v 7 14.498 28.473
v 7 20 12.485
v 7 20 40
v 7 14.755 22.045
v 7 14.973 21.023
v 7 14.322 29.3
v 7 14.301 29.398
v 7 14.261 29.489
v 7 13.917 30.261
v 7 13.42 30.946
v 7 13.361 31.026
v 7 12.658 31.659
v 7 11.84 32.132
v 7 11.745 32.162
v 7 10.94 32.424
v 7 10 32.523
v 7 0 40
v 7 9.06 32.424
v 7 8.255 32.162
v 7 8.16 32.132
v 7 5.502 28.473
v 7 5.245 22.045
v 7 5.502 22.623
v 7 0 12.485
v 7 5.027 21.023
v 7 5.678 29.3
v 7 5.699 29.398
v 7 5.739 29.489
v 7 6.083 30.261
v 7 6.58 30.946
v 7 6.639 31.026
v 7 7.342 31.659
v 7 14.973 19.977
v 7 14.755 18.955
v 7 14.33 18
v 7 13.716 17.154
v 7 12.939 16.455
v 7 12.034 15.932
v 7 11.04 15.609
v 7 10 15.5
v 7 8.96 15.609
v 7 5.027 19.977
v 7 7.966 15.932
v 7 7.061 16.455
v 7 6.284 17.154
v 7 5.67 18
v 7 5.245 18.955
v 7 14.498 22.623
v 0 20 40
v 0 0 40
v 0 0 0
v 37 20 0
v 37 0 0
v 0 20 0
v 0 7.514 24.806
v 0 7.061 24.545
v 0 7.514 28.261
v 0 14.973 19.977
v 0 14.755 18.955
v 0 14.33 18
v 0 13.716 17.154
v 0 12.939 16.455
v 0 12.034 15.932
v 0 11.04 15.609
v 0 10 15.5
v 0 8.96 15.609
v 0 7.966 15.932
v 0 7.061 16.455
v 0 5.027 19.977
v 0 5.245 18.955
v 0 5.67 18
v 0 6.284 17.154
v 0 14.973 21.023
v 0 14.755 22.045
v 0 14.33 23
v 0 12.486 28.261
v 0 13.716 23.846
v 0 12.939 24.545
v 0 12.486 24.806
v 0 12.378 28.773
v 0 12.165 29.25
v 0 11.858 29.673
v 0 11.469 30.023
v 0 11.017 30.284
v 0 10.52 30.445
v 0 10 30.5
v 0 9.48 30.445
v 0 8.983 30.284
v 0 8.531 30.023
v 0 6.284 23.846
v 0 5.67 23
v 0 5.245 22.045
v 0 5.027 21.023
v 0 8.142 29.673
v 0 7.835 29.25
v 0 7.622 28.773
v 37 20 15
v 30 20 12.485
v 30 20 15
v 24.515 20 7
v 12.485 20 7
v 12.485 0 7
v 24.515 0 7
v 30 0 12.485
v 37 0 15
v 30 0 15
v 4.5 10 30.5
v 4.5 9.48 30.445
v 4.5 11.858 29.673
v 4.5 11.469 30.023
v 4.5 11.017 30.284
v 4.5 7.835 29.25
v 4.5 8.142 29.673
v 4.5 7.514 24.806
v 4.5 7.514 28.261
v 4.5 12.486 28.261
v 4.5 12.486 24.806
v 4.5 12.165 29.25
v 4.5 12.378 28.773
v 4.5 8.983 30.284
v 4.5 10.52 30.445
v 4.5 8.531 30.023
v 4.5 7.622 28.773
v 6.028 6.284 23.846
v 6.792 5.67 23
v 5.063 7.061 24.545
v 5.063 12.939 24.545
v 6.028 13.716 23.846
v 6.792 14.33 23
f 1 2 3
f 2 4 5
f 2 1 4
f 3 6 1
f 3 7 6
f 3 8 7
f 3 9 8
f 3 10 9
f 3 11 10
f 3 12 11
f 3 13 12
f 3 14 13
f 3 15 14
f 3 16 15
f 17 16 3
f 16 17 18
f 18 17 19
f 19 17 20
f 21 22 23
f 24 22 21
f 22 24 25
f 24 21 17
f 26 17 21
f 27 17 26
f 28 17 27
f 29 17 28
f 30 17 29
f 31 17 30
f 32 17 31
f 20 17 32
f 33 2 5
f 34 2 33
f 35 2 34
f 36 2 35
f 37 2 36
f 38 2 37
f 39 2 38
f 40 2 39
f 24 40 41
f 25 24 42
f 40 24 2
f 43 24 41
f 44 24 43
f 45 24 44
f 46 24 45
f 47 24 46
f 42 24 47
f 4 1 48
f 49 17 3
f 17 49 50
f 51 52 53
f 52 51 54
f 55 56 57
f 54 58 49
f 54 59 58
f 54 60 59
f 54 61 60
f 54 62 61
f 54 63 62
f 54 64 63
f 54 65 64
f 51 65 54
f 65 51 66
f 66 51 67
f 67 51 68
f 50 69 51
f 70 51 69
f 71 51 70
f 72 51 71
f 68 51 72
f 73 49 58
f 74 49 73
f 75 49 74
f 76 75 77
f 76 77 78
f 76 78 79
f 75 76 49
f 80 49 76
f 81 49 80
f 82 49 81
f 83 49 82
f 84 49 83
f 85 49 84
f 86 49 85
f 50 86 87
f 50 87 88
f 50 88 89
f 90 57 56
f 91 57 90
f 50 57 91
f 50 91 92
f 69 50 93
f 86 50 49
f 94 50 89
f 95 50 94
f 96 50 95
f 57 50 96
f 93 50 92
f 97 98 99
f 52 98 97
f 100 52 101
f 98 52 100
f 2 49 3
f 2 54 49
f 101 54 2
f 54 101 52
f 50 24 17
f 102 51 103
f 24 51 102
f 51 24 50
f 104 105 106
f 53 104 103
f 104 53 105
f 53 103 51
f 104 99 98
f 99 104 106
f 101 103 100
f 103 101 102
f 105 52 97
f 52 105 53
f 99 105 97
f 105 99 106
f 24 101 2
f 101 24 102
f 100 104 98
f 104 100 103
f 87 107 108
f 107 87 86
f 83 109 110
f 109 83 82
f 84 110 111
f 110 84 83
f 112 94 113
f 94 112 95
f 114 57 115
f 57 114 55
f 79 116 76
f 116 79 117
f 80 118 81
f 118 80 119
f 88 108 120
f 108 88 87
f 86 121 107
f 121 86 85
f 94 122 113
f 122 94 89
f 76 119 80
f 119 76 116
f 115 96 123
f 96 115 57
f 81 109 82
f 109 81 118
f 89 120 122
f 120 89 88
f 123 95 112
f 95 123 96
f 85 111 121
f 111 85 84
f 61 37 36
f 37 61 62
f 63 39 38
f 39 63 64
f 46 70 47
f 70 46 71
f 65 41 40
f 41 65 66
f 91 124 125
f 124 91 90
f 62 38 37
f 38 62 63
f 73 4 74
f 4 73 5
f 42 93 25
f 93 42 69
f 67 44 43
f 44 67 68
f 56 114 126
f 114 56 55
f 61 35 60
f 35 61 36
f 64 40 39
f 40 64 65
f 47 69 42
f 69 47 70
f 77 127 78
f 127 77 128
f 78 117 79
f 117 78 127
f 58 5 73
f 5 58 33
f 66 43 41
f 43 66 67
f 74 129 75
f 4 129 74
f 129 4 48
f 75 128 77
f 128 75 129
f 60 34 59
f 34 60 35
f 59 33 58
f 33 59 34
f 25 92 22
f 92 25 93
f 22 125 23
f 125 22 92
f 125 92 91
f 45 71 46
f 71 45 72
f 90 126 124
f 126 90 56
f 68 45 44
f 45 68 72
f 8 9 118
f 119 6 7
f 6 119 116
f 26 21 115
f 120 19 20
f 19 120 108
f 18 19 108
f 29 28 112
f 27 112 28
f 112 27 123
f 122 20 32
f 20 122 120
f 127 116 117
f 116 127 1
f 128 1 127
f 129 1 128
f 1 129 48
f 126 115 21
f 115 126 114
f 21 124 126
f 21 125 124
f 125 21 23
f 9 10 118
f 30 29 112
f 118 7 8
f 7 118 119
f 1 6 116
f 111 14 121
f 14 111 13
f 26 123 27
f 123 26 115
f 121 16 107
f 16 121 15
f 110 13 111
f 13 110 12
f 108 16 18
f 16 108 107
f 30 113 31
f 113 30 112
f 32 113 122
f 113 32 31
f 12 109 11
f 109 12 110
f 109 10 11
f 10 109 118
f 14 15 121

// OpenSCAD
// length of the hook
hookLength = 20;

// height of the wall mounted part
hookHeight = 40;

// depth of the hook area
hookDepth = 23;

// number of holes
holeCount = 1; // [0:70]

// hole diameter
holeDiameter = 5;

// hole offset to the top and the sides of the hook
holeOffset = 12;

// activates the tapered holes
holeTapered = 1; // [0:No, 1:Yes]

// enables the keyhole-style opening
holeKeyhole = 1; // [0:No, 1:Yes]

// separated hook count
hookCount = 1;

// distance from hook to hook
hookDistance = 20;

// activate rounded Corners (the hook will get 2mm thicker) [EXPERIMENTAL]
roundCorners  = 0; // [0:No, 1:Yes]

holeRadius = holeDiameter / 2.;
holeRadiusCountersunk = holeRadius * 2;
holeDepthCountersunk = holeRadius * 1;
holeZ = hookHeight - holeOffset;

holeDistance = (hookLength - (2 * holeOffset)) / 
(holeCount - 1);

hookSeperatorDistance = (hookLength - (hookDistance * (hookCount - 1))) / (hookCount);

module MyHook(){
	// set number of faces
	$fn=30; 
	
	difference(){
		if(roundCorners){
			minkowski(){
				plainMultipleHook();
				sphere(1, centered=true, $fn=20);
			}
		}else{
			plainMultipleHook();
		}
		generateHoles();
		
	}
}

module plainMultipleHook(){
	difference(){
		plainHook();
		multipleHookSpacers();
	}
}

module plainHook(){
	union(){
		// upper
		cube([7,hookLength,hookHeight]);
			
		// lower
		translate([7,0,0]) cube([hookDepth ,hookLength,7]);
		// hook
		translate([7 + hookDepth ,0,0]) cube([7,hookLength,15]);
			
		// corners
		translate([2,0,9]) rotate([0,45,0]) cube([10,hookLength,6]);
		translate([hookDepth + 5 ,0,2]) rotate([0,-45,0]) cube([10,hookLength,6]);
	}
}

module multipleHookSpacers(){
	// seperator boxes
	if(hookCount >= 2){
		for(seperator = [1: hookCount - 1]){
			translate([13, seperator * hookSeperatorDistance + hookDistance * (seperator - 1), -1]) cube([hookDepth + 7, hookDistance, 17]);
		}
	}
}

module generateHoles(){
	if(holeCount == 1){
		holeYPosition = hookLength / 2;
		generateSingleHole(holeYPosition);
	}else{
		
		for(hole = [0: holeCount - 1]){
			holeYPosition = hole * holeDistance + holeOffset;
			generateSingleHole(holeYPosition);
		}
	}
}

module generateSingleHole(holeYPosition){
	translate([0, holeYPosition, holeZ]){
		// hole
		translate([-5,0,0])
		rotate([0,90,0])
		cylinder(22, holeRadius, holeRadius);
		
		// tapering
		if(holeTapered){
			hull() {
				union() {
					translate([7 - holeDepthCountersunk, 0, 0])
					rotate([0,90,0])
					cylinder(3.1, holeRadius, holeRadiusCountersunk);
					
					translate([7.59, 0, 0])
					rotate([0,90,0])
					cylinder(10,holeRadiusCountersunk, holeRadiusCountersunk);
				}
				if(holeKeyhole) translate([0,0,-holeRadiusCountersunk * 1.5]) union() {
					translate([7 - holeDepthCountersunk, 0, 0])
					rotate([0,90,0])
					cylinder(3.1, holeRadius, holeRadiusCountersunk);
					
					translate([7.59, 0, 0])
					rotate([0,90,0])
					cylinder(10,holeRadiusCountersunk, holeRadiusCountersunk);
				}
			}
		}

		if(holeKeyhole){
			hull(){
				translate([-5,0,0]) rotate([0,90,0]) cylinder(22, holeRadius, holeRadius);
				translate([-5,0,-holeRadiusCountersunk * 1.5]) rotate([0,90,0]) cylinder(22, holeRadius, holeRadius);
			}
			translate([-1,0,-holeRadiusCountersunk * 1.5])
				rotate([0,90,0])
					cylinder(h = 10, r = holeRadiusCountersunk);
		}
	}
}

MyHook();
